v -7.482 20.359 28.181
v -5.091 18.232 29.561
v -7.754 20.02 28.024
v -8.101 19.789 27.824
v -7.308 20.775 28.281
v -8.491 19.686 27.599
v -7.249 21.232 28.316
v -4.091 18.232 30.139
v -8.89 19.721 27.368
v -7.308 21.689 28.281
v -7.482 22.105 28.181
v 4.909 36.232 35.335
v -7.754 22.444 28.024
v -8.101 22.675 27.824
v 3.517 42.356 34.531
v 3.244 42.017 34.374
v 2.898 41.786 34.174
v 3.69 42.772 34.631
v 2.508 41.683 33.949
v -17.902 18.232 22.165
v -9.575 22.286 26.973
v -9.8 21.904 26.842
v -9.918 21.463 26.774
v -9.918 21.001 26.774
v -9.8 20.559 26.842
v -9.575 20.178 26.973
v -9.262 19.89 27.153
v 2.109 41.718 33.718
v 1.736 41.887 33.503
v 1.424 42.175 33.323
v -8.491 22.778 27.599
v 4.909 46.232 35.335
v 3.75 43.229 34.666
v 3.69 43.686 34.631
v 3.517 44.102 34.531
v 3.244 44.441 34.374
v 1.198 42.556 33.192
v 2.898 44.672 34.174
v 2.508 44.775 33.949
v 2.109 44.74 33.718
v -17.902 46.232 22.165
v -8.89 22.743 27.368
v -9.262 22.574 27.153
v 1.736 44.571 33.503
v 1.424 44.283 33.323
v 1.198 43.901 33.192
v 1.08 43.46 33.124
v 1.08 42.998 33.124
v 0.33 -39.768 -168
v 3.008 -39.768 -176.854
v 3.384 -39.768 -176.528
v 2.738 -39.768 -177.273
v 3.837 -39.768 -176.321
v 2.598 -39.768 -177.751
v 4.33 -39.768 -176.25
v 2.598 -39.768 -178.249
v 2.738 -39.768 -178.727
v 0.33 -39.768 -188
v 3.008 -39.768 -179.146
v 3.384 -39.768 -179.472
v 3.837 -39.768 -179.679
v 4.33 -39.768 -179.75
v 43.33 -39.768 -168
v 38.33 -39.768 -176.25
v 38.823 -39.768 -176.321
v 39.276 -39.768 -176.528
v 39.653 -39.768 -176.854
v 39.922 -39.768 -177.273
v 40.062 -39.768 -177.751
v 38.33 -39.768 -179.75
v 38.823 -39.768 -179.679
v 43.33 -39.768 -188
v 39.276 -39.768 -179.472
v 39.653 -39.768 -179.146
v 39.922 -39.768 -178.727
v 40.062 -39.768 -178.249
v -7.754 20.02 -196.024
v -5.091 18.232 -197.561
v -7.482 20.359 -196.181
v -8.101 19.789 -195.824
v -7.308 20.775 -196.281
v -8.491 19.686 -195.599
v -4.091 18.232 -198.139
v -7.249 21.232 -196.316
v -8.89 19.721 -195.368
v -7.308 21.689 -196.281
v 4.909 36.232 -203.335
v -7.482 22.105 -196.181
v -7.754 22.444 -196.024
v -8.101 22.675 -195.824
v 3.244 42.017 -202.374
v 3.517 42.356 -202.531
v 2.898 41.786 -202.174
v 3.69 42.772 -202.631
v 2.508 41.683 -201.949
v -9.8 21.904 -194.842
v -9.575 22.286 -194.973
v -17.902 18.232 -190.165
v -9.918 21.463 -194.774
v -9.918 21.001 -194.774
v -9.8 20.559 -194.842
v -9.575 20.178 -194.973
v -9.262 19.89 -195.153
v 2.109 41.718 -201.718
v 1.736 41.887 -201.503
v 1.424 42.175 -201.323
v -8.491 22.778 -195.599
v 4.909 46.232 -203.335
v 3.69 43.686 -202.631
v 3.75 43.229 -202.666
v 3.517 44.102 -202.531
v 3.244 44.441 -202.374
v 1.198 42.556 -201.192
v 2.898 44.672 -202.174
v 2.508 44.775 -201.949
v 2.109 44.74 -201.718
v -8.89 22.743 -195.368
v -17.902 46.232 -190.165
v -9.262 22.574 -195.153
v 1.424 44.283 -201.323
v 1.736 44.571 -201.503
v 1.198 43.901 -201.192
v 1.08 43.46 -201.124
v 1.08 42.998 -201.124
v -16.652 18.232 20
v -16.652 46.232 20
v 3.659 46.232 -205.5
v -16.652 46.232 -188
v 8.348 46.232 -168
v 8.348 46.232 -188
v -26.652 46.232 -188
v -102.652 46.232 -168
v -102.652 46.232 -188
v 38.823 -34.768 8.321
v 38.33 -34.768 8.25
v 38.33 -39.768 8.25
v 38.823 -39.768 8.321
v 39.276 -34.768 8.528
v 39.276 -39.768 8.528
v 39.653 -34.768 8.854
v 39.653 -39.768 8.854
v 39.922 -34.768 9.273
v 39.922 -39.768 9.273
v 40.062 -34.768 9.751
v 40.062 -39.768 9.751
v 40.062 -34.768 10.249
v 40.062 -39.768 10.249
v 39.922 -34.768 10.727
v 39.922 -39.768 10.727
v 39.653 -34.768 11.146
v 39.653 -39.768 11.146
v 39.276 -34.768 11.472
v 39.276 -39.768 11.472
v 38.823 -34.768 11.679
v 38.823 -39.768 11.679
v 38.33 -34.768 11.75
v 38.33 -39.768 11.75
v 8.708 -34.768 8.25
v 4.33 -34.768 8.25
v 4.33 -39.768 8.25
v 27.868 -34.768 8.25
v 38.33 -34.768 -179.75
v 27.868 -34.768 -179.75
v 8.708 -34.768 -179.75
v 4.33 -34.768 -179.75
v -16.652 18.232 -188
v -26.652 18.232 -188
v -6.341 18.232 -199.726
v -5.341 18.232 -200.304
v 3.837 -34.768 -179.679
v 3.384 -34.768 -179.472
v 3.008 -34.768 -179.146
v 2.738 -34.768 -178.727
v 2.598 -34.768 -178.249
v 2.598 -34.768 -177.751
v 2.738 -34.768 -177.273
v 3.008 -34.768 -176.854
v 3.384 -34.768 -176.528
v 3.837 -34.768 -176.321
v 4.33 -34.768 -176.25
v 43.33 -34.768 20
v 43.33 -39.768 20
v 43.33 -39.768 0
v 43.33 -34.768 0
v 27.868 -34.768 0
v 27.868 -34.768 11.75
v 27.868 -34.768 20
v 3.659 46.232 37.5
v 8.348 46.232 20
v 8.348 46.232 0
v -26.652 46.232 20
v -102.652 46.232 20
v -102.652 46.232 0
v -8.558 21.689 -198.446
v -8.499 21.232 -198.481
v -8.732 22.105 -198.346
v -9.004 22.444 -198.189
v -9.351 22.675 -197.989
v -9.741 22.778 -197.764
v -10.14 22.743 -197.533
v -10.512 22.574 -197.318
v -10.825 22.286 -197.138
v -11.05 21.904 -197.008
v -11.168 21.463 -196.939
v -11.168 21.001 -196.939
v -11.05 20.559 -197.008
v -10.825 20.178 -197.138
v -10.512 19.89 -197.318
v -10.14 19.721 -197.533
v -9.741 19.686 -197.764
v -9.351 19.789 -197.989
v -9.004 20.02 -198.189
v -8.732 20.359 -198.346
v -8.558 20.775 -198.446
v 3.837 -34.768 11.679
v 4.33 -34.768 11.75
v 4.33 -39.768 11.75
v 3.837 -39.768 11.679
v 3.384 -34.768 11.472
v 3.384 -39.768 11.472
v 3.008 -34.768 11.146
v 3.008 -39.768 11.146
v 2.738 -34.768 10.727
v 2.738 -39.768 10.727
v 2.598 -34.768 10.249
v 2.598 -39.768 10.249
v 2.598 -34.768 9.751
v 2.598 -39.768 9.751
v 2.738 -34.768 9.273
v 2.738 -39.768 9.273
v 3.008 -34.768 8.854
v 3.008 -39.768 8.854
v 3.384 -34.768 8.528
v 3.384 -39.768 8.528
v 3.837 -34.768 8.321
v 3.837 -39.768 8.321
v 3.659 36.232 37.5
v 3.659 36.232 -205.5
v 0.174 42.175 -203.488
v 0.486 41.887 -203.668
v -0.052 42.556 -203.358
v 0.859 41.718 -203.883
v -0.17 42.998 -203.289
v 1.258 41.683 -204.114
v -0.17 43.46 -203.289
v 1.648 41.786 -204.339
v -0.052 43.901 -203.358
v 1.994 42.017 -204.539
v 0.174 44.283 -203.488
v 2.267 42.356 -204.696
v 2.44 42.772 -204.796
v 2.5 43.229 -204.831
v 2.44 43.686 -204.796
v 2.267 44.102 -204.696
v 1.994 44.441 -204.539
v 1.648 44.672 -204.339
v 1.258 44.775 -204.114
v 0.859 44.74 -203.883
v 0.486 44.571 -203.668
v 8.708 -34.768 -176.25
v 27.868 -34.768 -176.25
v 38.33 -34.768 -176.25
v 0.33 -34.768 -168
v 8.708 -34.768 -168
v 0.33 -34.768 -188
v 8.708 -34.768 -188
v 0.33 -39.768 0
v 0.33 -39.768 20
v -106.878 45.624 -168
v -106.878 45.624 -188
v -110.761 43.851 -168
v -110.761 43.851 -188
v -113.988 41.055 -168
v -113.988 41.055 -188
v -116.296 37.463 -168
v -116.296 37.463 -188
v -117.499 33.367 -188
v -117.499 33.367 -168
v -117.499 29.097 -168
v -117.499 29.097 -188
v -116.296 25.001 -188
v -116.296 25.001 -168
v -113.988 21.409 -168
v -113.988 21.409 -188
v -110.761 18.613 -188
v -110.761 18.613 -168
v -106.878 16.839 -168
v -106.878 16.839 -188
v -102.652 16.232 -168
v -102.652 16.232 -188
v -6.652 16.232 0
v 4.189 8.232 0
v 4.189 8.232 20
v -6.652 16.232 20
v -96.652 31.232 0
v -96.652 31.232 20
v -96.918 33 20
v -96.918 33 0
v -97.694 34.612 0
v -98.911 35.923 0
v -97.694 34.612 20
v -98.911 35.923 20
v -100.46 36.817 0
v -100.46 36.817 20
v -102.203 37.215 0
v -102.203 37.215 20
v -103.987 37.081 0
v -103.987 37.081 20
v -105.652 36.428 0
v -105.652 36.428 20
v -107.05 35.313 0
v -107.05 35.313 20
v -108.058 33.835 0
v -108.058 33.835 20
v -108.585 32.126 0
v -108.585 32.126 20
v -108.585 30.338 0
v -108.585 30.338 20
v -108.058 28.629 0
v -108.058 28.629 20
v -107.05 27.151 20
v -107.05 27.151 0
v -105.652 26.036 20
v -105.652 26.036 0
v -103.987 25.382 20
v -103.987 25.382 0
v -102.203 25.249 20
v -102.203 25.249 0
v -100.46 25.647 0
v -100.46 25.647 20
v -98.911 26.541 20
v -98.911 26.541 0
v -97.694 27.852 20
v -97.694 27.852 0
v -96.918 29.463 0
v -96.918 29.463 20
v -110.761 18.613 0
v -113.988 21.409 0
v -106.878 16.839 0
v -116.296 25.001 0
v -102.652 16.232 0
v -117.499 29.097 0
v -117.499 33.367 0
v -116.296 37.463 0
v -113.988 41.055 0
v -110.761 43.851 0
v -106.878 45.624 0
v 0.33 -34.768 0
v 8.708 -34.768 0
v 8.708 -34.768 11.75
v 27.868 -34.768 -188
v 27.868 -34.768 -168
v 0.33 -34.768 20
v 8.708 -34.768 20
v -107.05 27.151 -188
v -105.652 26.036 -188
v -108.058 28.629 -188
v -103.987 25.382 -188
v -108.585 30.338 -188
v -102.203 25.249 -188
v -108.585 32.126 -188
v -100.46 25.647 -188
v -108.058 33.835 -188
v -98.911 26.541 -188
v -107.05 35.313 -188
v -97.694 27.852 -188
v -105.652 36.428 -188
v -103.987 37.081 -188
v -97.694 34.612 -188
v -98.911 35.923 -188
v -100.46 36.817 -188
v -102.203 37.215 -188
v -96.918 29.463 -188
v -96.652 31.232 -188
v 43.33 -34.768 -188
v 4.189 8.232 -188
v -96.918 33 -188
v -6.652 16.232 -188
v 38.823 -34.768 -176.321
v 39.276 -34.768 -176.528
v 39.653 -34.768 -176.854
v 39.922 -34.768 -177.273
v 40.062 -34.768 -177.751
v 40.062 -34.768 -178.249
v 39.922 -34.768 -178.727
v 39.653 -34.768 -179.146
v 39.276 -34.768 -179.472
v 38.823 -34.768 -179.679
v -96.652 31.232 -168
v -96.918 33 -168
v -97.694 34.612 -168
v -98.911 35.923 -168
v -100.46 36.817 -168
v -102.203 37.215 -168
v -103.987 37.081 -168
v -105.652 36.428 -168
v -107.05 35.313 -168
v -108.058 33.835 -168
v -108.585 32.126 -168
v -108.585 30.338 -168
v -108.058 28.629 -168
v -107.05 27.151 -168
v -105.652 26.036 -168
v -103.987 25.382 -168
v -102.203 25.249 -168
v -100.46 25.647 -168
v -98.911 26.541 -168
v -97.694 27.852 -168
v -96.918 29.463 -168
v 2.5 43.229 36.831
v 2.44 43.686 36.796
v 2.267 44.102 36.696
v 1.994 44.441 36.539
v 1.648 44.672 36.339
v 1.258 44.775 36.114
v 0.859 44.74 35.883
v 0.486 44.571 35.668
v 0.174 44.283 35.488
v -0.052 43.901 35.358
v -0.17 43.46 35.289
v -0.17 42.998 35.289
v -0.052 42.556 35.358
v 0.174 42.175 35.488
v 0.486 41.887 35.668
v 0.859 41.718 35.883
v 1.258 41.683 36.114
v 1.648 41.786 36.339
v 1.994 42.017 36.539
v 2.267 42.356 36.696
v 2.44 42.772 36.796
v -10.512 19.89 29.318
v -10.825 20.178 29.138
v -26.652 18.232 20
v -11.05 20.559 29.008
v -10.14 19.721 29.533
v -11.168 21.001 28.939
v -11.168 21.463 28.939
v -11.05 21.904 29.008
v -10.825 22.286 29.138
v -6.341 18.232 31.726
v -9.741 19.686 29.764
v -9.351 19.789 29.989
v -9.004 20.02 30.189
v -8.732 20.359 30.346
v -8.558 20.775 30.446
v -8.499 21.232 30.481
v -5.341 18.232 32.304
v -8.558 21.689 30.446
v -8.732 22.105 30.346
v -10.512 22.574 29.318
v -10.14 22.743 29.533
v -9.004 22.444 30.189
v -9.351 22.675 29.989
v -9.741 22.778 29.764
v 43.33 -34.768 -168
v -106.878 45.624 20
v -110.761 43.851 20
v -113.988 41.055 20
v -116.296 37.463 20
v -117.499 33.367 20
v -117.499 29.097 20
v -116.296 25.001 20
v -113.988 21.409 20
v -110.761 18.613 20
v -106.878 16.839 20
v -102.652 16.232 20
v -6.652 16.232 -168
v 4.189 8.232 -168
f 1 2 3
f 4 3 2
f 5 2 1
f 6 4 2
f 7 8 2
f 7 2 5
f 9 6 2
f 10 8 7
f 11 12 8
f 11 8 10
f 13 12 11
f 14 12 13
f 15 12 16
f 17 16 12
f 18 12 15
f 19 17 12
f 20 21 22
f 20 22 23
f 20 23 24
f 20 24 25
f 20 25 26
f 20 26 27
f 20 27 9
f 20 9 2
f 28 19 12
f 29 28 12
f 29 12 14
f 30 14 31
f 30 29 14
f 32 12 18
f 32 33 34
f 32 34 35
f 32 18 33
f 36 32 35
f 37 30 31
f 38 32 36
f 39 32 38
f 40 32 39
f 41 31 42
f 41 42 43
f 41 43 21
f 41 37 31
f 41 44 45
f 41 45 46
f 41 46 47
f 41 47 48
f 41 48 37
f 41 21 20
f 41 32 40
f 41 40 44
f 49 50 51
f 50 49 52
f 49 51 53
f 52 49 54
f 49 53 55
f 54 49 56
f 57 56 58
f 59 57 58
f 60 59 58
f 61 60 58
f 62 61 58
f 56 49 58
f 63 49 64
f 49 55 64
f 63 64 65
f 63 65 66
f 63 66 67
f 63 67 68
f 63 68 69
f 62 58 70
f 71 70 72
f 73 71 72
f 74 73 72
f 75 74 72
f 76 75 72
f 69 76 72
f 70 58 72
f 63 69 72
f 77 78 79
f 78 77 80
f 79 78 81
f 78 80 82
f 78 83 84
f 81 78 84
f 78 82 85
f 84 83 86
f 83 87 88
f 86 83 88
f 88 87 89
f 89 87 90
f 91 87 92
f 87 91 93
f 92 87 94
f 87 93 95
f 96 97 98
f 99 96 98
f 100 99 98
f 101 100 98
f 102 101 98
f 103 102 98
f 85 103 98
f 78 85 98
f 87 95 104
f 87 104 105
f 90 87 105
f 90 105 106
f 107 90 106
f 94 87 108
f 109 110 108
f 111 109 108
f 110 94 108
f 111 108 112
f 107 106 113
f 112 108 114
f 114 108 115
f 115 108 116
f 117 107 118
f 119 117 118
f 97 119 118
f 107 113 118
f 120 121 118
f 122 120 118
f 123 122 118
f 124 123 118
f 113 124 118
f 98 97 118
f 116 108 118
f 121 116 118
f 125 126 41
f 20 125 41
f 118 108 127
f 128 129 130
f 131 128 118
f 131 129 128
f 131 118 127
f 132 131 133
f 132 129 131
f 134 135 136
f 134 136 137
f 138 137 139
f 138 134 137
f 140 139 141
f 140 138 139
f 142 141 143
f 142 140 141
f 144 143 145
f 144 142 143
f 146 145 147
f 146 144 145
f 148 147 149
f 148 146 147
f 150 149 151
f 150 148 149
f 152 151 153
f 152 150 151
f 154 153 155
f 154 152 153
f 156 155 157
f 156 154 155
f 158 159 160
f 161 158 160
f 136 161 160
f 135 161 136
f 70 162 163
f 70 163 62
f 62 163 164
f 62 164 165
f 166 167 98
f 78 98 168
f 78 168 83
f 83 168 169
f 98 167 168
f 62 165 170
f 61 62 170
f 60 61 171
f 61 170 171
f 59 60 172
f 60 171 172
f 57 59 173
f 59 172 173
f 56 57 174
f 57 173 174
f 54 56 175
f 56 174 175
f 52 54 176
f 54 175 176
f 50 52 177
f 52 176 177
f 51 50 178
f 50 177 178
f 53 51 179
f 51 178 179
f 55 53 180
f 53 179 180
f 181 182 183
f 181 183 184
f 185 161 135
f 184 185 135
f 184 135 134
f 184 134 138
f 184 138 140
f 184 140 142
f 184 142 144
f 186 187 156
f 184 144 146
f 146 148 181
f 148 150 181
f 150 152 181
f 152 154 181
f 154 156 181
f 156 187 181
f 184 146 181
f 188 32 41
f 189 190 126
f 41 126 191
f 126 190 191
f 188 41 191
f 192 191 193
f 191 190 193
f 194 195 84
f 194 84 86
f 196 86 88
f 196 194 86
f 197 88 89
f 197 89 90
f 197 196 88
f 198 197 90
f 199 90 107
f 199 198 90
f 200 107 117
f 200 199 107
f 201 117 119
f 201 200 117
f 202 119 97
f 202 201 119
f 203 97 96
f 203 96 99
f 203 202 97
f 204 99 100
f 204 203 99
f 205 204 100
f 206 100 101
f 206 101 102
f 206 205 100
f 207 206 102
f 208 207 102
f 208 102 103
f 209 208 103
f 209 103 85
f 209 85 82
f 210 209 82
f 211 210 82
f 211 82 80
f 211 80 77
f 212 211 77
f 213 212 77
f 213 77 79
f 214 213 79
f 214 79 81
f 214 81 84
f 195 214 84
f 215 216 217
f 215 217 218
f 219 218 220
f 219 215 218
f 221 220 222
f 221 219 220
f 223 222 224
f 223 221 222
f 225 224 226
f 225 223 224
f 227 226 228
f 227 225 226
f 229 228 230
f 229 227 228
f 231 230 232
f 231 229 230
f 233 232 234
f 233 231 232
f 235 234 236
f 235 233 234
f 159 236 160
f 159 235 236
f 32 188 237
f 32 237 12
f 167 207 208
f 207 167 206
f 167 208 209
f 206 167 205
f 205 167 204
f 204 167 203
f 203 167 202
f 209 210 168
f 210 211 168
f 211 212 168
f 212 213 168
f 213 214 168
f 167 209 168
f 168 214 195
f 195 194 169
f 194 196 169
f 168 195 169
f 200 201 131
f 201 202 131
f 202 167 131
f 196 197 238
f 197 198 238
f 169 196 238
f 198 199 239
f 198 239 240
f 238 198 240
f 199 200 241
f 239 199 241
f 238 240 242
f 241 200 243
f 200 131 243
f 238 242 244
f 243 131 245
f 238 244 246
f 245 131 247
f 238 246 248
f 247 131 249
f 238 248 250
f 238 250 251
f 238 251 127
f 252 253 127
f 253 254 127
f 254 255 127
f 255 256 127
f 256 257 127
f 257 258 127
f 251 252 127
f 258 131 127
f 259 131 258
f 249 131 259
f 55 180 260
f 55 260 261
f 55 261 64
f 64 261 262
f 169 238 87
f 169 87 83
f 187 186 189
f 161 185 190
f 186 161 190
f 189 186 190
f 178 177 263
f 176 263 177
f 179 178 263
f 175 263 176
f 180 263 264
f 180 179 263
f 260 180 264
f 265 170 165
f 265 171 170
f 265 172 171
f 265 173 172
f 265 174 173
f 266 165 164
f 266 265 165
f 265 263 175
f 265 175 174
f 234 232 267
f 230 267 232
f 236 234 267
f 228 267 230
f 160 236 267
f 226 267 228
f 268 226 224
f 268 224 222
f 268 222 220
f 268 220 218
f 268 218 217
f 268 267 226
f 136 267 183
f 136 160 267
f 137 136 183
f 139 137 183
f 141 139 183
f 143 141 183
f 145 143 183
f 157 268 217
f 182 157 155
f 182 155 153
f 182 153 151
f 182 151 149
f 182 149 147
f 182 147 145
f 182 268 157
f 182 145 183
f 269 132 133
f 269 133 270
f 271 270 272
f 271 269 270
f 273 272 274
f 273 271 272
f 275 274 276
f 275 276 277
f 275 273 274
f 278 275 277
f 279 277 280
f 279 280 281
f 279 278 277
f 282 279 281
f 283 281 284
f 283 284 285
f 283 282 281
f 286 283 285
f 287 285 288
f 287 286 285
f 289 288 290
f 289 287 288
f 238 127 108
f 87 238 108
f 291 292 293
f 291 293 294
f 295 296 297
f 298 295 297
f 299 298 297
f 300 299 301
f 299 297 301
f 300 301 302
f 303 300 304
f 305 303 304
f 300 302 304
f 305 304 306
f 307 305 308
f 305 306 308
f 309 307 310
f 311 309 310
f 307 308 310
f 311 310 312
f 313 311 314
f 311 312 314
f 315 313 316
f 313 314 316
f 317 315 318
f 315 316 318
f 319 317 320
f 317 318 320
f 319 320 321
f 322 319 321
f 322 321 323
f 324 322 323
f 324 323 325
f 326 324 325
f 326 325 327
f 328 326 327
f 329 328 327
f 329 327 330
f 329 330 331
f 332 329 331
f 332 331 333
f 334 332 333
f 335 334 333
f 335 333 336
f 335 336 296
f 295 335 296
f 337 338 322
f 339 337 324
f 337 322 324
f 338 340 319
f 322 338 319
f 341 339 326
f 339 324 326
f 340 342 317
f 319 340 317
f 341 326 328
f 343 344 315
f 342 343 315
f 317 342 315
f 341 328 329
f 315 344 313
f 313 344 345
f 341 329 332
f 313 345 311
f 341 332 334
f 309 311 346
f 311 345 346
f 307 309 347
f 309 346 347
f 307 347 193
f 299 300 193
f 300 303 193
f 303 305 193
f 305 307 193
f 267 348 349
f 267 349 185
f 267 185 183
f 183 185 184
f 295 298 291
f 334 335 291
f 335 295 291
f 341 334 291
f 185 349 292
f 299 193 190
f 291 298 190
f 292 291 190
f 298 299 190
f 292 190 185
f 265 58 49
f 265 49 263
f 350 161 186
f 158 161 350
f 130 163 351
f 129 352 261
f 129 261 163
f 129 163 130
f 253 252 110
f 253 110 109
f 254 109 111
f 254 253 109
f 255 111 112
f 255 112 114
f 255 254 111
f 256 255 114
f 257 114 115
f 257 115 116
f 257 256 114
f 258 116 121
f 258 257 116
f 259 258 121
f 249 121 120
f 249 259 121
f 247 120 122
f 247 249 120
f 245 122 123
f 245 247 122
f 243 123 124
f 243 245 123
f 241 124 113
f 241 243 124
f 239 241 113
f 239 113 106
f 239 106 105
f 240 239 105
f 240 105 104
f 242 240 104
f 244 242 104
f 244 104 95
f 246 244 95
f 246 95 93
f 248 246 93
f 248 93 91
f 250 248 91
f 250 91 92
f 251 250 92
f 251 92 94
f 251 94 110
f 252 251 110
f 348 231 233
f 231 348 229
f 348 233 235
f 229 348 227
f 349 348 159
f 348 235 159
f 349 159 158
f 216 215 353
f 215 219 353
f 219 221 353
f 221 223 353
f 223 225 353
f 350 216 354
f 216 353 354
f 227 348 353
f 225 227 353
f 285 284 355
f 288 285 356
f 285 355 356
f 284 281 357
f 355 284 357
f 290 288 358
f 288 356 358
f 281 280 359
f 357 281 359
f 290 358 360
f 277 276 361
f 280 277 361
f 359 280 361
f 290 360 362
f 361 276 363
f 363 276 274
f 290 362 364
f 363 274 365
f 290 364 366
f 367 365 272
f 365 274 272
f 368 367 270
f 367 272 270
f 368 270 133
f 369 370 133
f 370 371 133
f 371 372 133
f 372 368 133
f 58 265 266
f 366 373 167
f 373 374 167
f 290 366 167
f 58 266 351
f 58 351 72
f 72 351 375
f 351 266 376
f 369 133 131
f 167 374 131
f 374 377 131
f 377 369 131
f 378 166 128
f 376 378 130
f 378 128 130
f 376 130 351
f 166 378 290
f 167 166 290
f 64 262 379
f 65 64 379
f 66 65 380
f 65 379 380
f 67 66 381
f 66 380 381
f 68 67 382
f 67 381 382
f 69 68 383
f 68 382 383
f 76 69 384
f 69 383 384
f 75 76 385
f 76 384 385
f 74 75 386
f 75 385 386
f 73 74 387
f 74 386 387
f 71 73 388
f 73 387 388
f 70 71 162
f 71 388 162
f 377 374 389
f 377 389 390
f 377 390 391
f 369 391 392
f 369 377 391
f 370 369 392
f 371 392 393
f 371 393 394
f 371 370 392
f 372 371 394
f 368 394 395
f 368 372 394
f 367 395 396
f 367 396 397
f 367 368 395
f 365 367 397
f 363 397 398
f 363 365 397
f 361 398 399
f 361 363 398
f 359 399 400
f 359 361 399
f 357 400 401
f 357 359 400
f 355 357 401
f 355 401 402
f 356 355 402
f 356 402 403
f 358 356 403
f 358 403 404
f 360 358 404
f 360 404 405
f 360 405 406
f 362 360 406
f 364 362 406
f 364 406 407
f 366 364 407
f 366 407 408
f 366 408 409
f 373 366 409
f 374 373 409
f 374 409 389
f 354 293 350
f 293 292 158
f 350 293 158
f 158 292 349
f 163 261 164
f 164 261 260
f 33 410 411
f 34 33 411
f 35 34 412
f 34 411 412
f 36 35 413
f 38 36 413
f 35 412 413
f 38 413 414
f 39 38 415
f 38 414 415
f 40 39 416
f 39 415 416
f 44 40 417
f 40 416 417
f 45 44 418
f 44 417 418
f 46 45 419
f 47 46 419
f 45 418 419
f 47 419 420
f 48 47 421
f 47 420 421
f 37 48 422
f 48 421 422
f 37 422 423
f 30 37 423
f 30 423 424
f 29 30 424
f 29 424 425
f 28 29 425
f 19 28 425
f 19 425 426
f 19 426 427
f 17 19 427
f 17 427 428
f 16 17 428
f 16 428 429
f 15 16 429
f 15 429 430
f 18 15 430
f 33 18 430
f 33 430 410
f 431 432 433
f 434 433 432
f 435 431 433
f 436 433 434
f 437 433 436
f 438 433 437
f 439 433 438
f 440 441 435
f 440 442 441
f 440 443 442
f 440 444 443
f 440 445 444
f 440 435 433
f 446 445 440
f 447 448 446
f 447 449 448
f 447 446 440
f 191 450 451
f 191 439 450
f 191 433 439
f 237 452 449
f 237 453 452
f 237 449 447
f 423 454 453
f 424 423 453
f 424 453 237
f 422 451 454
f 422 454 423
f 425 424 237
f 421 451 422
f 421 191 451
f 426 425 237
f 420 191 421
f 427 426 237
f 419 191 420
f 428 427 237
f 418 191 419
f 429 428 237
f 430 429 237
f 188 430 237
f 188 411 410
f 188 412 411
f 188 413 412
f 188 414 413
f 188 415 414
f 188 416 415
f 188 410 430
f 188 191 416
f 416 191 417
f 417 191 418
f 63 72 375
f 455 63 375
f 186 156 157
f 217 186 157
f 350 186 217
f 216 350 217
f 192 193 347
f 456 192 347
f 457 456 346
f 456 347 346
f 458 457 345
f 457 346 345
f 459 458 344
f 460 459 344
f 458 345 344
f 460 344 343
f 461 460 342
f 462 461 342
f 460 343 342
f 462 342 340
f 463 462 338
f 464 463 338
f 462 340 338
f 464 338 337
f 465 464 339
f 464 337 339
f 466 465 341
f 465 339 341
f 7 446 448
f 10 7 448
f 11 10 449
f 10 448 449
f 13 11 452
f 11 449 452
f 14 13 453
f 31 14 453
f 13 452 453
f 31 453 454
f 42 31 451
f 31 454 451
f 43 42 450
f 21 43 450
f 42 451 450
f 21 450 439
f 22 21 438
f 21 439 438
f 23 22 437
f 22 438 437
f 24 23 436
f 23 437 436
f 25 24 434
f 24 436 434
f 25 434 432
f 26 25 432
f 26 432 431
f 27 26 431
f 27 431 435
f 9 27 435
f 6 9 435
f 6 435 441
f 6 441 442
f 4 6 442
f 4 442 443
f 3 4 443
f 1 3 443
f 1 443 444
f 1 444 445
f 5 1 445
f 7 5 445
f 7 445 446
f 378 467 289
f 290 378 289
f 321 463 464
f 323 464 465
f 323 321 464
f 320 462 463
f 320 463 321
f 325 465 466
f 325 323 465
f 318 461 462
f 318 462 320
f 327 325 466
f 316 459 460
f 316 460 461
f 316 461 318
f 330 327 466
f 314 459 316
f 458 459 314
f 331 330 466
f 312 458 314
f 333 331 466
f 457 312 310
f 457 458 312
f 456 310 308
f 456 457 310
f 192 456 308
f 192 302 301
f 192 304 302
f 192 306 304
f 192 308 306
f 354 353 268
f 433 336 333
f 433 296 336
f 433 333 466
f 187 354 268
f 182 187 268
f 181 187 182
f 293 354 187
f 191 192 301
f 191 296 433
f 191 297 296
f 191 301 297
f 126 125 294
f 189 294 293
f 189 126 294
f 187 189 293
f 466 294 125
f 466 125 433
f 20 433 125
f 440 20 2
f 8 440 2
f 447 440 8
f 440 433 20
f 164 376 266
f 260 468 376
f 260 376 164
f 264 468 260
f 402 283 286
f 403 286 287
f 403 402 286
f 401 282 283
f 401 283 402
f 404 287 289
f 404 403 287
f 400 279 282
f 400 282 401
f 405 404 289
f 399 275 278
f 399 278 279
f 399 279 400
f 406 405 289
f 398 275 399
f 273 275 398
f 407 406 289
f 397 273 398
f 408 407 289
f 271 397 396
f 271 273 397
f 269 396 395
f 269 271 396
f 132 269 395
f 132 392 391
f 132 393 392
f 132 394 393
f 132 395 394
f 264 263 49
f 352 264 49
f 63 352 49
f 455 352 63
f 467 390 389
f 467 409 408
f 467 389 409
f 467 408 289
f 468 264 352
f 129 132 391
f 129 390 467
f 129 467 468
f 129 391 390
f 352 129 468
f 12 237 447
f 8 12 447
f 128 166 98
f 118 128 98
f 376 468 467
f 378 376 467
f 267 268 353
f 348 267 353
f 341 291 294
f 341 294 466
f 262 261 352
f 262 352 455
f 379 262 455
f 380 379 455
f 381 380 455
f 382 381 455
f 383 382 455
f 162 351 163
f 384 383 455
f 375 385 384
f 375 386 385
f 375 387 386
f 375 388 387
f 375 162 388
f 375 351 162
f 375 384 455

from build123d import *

# Parameters (mm, degrees)
EXTRUDE_1_DEPTH      = 20
SKETCH_9_R           = 6
CUT_EXTRUDE_5_DEPTH  = 128.981833025
EXTRUDE_4_DEPTH      = 20
SKETCH_16_W          = 43
SKETCH_16_H          = 5
EXTRUDE_5_DEPTH      = 20
CUT_EXTRUDE_7_DEPTH  = 145.232318713
EXTRUDE_6_DEPTH      = 30
EXTRUDE_7_DEPTH      = 30
SKETCH_26_R          = 1.55
CUT_EXTRUDE_8_DEPTH  = 10
CUT_EXTRUDE_9_DEPTH  = 10
CUT_EXTRUDE_10_DEPTH = 2
SKETCH_29_W          = 2.5
SKETCH_29_H          = 2
CUT_EXTRUDE_11_DEPTH = 2


with BuildPart() as part:
    # 草图1 → 凸台-拉伸1 (new body)
    with BuildSketch(Plane.XY):
        with BuildLine():
            Line((3.348133201, 16.231891841), (9.233970376, -39.768108159))
            Line((9.233970376, -39.768108159), (29.072758503, -39.768108159))
            Line((29.072758503, -39.768108159), (8.348133201, 46.231891841))
            Line((8.348133201, 46.231891841), (-102.651866799, 46.231891841))
            ThreePointArc((-102.651866799, 46.231891841), (-117.651866799, 31.231891841), (-102.651866799, 16.231891841))
            Line((-102.651866799, 16.231891841), (3.348133201, 16.231891841))
        make_face()
    extrude(amount=EXTRUDE_1_DEPTH)

    # 草图9 → 切除-拉伸5 (cut, through all)
    with BuildSketch(Plane.XY.offset(20)):
        with Locations((-102.651866799, 31.231891841)):
            Circle(SKETCH_9_R)
    extrude(amount=-CUT_EXTRUDE_5_DEPTH, mode=Mode.SUBTRACT)

    # 草图15 → 凸台-拉伸4 (add, through all)
    with BuildSketch(Plane.XY.offset(20)):
        Polygon((4.188967083, 8.231891841), (-6.651866799, 16.231891841), (3.348133201, 16.231891841), align=None)
    extrude(amount=-EXTRUDE_4_DEPTH)

    # 草图16 → 凸台-拉伸5 (add, through all)
    with BuildSketch(Plane.XY.offset(20)):
        with Locations((21.830228257, -37.268108159)):
            Rectangle(SKETCH_16_W, SKETCH_16_H)
    extrude(amount=-EXTRUDE_5_DEPTH)

    # 草图17 → 切除-拉伸7 (cut, through all)
    with BuildSketch(Plane(origin=(0, -34.768108159, 0), x_dir=(1, 0, 0), z_dir=(0, 1, 0))):
        with BuildLine():
            Line((4.330228257, -8.25), (38.330228257, -8.25))
            ThreePointArc((38.330228257, -8.25), (40.080228257, -10), (38.330228257, -11.75))
            Line((38.330228257, -11.75), (4.330228257, -11.75))
            ThreePointArc((4.330228257, -11.75), (2.580228257, -10), (4.330228257, -8.25))
        make_face()
    extrude(amount=-CUT_EXTRUDE_7_DEPTH, mode=Mode.SUBTRACT)

    # 草图23 → 凸台-拉伸6 (add)
    with BuildSketch(Plane(origin=(0, 46.231891841, 0), x_dir=(1, 0, 0), z_dir=(0, 1, 0))):
        Polygon((-26.651866799, -20), (3.659022333, -37.5), (4.909022333, -35.334936491), (-21.651866799, -20), align=None)
    extrude(amount=-EXTRUDE_6_DEPTH)

    # 草图25 → 凸台-拉伸7 (add)
    with BuildSketch(Plane(origin=(0, 46.231891841, 0), x_dir=(1, 0, 0), z_dir=(0, 1, 0))):
        Polygon((-21.651866799, -20), (-16.651866799, -20), (-17.901866799, -22.165063509), align=None)
    extrude(amount=-EXTRUDE_7_DEPTH)

    # 草图26 → 切除-拉伸8 (cut)
    with BuildSketch(Plane(origin=(-15.323220738, 0, 26.540596853), x_dir=(0.866025403784438, 0, 0.5000000000000012), z_dir=(-0.5000000000000012, 0, 0.866025403784438))):
        with Locations((19.030349026, 43.228937097)):
            Circle(SKETCH_26_R)
        with Locations((6.330349026, 21.231891841)):
            Circle(SKETCH_26_R)
    extrude(amount=-CUT_EXTRUDE_8_DEPTH, mode=Mode.SUBTRACT)

    # 草图27 → 切除-拉伸9 (cut)
    with BuildSketch(Plane(origin=(-15.323220738, 0, 26.540596853), x_dir=(0.866025403784438, 0, 0.5000000000000012), z_dir=(-0.5000000000000012, 0, 0.866025403784438))):
        Polygon((21.918806294, 36.231891841), (10.37180091, 16.231891841), (21.918806294, 16.231891841), align=None)
    extrude(amount=-CUT_EXTRUDE_9_DEPTH, mode=Mode.SUBTRACT)

    # 草图28 → 切除-拉伸10 (cut)
    with BuildSketch(Plane.XZ.offset(-16.231891841)):
        Polygon((-26.651866799, 20), (-16.651866799, 20), (-17.901866799, 22.165063509), (-5.090977667, 29.561433799), (-6.340977667, 31.726497308), align=None)
    extrude(amount=-CUT_EXTRUDE_10_DEPTH, mode=Mode.SUBTRACT)

    # 草图29 → 切除-拉伸11 (cut)
    with BuildSketch(Plane(origin=(8.982243071, 0, 5.185900455), x_dir=(-0.5000000000000022, 0, 0.8660254037844374), z_dir=(-0.8660254037844374, 0, -0.5000000000000022))):
        with Locations((29.396441475, 17.231891841)):
            Rectangle(SKETCH_29_W, SKETCH_29_H)
    extrude(amount=-CUT_EXTRUDE_11_DEPTH, mode=Mode.SUBTRACT)


with BuildPart() as body_2:
    # 镜向3: mirrored copy
    add(part.part.mirror(Plane.XY.offset(-84)))


solid = Compound([part.part, body_2.part])
